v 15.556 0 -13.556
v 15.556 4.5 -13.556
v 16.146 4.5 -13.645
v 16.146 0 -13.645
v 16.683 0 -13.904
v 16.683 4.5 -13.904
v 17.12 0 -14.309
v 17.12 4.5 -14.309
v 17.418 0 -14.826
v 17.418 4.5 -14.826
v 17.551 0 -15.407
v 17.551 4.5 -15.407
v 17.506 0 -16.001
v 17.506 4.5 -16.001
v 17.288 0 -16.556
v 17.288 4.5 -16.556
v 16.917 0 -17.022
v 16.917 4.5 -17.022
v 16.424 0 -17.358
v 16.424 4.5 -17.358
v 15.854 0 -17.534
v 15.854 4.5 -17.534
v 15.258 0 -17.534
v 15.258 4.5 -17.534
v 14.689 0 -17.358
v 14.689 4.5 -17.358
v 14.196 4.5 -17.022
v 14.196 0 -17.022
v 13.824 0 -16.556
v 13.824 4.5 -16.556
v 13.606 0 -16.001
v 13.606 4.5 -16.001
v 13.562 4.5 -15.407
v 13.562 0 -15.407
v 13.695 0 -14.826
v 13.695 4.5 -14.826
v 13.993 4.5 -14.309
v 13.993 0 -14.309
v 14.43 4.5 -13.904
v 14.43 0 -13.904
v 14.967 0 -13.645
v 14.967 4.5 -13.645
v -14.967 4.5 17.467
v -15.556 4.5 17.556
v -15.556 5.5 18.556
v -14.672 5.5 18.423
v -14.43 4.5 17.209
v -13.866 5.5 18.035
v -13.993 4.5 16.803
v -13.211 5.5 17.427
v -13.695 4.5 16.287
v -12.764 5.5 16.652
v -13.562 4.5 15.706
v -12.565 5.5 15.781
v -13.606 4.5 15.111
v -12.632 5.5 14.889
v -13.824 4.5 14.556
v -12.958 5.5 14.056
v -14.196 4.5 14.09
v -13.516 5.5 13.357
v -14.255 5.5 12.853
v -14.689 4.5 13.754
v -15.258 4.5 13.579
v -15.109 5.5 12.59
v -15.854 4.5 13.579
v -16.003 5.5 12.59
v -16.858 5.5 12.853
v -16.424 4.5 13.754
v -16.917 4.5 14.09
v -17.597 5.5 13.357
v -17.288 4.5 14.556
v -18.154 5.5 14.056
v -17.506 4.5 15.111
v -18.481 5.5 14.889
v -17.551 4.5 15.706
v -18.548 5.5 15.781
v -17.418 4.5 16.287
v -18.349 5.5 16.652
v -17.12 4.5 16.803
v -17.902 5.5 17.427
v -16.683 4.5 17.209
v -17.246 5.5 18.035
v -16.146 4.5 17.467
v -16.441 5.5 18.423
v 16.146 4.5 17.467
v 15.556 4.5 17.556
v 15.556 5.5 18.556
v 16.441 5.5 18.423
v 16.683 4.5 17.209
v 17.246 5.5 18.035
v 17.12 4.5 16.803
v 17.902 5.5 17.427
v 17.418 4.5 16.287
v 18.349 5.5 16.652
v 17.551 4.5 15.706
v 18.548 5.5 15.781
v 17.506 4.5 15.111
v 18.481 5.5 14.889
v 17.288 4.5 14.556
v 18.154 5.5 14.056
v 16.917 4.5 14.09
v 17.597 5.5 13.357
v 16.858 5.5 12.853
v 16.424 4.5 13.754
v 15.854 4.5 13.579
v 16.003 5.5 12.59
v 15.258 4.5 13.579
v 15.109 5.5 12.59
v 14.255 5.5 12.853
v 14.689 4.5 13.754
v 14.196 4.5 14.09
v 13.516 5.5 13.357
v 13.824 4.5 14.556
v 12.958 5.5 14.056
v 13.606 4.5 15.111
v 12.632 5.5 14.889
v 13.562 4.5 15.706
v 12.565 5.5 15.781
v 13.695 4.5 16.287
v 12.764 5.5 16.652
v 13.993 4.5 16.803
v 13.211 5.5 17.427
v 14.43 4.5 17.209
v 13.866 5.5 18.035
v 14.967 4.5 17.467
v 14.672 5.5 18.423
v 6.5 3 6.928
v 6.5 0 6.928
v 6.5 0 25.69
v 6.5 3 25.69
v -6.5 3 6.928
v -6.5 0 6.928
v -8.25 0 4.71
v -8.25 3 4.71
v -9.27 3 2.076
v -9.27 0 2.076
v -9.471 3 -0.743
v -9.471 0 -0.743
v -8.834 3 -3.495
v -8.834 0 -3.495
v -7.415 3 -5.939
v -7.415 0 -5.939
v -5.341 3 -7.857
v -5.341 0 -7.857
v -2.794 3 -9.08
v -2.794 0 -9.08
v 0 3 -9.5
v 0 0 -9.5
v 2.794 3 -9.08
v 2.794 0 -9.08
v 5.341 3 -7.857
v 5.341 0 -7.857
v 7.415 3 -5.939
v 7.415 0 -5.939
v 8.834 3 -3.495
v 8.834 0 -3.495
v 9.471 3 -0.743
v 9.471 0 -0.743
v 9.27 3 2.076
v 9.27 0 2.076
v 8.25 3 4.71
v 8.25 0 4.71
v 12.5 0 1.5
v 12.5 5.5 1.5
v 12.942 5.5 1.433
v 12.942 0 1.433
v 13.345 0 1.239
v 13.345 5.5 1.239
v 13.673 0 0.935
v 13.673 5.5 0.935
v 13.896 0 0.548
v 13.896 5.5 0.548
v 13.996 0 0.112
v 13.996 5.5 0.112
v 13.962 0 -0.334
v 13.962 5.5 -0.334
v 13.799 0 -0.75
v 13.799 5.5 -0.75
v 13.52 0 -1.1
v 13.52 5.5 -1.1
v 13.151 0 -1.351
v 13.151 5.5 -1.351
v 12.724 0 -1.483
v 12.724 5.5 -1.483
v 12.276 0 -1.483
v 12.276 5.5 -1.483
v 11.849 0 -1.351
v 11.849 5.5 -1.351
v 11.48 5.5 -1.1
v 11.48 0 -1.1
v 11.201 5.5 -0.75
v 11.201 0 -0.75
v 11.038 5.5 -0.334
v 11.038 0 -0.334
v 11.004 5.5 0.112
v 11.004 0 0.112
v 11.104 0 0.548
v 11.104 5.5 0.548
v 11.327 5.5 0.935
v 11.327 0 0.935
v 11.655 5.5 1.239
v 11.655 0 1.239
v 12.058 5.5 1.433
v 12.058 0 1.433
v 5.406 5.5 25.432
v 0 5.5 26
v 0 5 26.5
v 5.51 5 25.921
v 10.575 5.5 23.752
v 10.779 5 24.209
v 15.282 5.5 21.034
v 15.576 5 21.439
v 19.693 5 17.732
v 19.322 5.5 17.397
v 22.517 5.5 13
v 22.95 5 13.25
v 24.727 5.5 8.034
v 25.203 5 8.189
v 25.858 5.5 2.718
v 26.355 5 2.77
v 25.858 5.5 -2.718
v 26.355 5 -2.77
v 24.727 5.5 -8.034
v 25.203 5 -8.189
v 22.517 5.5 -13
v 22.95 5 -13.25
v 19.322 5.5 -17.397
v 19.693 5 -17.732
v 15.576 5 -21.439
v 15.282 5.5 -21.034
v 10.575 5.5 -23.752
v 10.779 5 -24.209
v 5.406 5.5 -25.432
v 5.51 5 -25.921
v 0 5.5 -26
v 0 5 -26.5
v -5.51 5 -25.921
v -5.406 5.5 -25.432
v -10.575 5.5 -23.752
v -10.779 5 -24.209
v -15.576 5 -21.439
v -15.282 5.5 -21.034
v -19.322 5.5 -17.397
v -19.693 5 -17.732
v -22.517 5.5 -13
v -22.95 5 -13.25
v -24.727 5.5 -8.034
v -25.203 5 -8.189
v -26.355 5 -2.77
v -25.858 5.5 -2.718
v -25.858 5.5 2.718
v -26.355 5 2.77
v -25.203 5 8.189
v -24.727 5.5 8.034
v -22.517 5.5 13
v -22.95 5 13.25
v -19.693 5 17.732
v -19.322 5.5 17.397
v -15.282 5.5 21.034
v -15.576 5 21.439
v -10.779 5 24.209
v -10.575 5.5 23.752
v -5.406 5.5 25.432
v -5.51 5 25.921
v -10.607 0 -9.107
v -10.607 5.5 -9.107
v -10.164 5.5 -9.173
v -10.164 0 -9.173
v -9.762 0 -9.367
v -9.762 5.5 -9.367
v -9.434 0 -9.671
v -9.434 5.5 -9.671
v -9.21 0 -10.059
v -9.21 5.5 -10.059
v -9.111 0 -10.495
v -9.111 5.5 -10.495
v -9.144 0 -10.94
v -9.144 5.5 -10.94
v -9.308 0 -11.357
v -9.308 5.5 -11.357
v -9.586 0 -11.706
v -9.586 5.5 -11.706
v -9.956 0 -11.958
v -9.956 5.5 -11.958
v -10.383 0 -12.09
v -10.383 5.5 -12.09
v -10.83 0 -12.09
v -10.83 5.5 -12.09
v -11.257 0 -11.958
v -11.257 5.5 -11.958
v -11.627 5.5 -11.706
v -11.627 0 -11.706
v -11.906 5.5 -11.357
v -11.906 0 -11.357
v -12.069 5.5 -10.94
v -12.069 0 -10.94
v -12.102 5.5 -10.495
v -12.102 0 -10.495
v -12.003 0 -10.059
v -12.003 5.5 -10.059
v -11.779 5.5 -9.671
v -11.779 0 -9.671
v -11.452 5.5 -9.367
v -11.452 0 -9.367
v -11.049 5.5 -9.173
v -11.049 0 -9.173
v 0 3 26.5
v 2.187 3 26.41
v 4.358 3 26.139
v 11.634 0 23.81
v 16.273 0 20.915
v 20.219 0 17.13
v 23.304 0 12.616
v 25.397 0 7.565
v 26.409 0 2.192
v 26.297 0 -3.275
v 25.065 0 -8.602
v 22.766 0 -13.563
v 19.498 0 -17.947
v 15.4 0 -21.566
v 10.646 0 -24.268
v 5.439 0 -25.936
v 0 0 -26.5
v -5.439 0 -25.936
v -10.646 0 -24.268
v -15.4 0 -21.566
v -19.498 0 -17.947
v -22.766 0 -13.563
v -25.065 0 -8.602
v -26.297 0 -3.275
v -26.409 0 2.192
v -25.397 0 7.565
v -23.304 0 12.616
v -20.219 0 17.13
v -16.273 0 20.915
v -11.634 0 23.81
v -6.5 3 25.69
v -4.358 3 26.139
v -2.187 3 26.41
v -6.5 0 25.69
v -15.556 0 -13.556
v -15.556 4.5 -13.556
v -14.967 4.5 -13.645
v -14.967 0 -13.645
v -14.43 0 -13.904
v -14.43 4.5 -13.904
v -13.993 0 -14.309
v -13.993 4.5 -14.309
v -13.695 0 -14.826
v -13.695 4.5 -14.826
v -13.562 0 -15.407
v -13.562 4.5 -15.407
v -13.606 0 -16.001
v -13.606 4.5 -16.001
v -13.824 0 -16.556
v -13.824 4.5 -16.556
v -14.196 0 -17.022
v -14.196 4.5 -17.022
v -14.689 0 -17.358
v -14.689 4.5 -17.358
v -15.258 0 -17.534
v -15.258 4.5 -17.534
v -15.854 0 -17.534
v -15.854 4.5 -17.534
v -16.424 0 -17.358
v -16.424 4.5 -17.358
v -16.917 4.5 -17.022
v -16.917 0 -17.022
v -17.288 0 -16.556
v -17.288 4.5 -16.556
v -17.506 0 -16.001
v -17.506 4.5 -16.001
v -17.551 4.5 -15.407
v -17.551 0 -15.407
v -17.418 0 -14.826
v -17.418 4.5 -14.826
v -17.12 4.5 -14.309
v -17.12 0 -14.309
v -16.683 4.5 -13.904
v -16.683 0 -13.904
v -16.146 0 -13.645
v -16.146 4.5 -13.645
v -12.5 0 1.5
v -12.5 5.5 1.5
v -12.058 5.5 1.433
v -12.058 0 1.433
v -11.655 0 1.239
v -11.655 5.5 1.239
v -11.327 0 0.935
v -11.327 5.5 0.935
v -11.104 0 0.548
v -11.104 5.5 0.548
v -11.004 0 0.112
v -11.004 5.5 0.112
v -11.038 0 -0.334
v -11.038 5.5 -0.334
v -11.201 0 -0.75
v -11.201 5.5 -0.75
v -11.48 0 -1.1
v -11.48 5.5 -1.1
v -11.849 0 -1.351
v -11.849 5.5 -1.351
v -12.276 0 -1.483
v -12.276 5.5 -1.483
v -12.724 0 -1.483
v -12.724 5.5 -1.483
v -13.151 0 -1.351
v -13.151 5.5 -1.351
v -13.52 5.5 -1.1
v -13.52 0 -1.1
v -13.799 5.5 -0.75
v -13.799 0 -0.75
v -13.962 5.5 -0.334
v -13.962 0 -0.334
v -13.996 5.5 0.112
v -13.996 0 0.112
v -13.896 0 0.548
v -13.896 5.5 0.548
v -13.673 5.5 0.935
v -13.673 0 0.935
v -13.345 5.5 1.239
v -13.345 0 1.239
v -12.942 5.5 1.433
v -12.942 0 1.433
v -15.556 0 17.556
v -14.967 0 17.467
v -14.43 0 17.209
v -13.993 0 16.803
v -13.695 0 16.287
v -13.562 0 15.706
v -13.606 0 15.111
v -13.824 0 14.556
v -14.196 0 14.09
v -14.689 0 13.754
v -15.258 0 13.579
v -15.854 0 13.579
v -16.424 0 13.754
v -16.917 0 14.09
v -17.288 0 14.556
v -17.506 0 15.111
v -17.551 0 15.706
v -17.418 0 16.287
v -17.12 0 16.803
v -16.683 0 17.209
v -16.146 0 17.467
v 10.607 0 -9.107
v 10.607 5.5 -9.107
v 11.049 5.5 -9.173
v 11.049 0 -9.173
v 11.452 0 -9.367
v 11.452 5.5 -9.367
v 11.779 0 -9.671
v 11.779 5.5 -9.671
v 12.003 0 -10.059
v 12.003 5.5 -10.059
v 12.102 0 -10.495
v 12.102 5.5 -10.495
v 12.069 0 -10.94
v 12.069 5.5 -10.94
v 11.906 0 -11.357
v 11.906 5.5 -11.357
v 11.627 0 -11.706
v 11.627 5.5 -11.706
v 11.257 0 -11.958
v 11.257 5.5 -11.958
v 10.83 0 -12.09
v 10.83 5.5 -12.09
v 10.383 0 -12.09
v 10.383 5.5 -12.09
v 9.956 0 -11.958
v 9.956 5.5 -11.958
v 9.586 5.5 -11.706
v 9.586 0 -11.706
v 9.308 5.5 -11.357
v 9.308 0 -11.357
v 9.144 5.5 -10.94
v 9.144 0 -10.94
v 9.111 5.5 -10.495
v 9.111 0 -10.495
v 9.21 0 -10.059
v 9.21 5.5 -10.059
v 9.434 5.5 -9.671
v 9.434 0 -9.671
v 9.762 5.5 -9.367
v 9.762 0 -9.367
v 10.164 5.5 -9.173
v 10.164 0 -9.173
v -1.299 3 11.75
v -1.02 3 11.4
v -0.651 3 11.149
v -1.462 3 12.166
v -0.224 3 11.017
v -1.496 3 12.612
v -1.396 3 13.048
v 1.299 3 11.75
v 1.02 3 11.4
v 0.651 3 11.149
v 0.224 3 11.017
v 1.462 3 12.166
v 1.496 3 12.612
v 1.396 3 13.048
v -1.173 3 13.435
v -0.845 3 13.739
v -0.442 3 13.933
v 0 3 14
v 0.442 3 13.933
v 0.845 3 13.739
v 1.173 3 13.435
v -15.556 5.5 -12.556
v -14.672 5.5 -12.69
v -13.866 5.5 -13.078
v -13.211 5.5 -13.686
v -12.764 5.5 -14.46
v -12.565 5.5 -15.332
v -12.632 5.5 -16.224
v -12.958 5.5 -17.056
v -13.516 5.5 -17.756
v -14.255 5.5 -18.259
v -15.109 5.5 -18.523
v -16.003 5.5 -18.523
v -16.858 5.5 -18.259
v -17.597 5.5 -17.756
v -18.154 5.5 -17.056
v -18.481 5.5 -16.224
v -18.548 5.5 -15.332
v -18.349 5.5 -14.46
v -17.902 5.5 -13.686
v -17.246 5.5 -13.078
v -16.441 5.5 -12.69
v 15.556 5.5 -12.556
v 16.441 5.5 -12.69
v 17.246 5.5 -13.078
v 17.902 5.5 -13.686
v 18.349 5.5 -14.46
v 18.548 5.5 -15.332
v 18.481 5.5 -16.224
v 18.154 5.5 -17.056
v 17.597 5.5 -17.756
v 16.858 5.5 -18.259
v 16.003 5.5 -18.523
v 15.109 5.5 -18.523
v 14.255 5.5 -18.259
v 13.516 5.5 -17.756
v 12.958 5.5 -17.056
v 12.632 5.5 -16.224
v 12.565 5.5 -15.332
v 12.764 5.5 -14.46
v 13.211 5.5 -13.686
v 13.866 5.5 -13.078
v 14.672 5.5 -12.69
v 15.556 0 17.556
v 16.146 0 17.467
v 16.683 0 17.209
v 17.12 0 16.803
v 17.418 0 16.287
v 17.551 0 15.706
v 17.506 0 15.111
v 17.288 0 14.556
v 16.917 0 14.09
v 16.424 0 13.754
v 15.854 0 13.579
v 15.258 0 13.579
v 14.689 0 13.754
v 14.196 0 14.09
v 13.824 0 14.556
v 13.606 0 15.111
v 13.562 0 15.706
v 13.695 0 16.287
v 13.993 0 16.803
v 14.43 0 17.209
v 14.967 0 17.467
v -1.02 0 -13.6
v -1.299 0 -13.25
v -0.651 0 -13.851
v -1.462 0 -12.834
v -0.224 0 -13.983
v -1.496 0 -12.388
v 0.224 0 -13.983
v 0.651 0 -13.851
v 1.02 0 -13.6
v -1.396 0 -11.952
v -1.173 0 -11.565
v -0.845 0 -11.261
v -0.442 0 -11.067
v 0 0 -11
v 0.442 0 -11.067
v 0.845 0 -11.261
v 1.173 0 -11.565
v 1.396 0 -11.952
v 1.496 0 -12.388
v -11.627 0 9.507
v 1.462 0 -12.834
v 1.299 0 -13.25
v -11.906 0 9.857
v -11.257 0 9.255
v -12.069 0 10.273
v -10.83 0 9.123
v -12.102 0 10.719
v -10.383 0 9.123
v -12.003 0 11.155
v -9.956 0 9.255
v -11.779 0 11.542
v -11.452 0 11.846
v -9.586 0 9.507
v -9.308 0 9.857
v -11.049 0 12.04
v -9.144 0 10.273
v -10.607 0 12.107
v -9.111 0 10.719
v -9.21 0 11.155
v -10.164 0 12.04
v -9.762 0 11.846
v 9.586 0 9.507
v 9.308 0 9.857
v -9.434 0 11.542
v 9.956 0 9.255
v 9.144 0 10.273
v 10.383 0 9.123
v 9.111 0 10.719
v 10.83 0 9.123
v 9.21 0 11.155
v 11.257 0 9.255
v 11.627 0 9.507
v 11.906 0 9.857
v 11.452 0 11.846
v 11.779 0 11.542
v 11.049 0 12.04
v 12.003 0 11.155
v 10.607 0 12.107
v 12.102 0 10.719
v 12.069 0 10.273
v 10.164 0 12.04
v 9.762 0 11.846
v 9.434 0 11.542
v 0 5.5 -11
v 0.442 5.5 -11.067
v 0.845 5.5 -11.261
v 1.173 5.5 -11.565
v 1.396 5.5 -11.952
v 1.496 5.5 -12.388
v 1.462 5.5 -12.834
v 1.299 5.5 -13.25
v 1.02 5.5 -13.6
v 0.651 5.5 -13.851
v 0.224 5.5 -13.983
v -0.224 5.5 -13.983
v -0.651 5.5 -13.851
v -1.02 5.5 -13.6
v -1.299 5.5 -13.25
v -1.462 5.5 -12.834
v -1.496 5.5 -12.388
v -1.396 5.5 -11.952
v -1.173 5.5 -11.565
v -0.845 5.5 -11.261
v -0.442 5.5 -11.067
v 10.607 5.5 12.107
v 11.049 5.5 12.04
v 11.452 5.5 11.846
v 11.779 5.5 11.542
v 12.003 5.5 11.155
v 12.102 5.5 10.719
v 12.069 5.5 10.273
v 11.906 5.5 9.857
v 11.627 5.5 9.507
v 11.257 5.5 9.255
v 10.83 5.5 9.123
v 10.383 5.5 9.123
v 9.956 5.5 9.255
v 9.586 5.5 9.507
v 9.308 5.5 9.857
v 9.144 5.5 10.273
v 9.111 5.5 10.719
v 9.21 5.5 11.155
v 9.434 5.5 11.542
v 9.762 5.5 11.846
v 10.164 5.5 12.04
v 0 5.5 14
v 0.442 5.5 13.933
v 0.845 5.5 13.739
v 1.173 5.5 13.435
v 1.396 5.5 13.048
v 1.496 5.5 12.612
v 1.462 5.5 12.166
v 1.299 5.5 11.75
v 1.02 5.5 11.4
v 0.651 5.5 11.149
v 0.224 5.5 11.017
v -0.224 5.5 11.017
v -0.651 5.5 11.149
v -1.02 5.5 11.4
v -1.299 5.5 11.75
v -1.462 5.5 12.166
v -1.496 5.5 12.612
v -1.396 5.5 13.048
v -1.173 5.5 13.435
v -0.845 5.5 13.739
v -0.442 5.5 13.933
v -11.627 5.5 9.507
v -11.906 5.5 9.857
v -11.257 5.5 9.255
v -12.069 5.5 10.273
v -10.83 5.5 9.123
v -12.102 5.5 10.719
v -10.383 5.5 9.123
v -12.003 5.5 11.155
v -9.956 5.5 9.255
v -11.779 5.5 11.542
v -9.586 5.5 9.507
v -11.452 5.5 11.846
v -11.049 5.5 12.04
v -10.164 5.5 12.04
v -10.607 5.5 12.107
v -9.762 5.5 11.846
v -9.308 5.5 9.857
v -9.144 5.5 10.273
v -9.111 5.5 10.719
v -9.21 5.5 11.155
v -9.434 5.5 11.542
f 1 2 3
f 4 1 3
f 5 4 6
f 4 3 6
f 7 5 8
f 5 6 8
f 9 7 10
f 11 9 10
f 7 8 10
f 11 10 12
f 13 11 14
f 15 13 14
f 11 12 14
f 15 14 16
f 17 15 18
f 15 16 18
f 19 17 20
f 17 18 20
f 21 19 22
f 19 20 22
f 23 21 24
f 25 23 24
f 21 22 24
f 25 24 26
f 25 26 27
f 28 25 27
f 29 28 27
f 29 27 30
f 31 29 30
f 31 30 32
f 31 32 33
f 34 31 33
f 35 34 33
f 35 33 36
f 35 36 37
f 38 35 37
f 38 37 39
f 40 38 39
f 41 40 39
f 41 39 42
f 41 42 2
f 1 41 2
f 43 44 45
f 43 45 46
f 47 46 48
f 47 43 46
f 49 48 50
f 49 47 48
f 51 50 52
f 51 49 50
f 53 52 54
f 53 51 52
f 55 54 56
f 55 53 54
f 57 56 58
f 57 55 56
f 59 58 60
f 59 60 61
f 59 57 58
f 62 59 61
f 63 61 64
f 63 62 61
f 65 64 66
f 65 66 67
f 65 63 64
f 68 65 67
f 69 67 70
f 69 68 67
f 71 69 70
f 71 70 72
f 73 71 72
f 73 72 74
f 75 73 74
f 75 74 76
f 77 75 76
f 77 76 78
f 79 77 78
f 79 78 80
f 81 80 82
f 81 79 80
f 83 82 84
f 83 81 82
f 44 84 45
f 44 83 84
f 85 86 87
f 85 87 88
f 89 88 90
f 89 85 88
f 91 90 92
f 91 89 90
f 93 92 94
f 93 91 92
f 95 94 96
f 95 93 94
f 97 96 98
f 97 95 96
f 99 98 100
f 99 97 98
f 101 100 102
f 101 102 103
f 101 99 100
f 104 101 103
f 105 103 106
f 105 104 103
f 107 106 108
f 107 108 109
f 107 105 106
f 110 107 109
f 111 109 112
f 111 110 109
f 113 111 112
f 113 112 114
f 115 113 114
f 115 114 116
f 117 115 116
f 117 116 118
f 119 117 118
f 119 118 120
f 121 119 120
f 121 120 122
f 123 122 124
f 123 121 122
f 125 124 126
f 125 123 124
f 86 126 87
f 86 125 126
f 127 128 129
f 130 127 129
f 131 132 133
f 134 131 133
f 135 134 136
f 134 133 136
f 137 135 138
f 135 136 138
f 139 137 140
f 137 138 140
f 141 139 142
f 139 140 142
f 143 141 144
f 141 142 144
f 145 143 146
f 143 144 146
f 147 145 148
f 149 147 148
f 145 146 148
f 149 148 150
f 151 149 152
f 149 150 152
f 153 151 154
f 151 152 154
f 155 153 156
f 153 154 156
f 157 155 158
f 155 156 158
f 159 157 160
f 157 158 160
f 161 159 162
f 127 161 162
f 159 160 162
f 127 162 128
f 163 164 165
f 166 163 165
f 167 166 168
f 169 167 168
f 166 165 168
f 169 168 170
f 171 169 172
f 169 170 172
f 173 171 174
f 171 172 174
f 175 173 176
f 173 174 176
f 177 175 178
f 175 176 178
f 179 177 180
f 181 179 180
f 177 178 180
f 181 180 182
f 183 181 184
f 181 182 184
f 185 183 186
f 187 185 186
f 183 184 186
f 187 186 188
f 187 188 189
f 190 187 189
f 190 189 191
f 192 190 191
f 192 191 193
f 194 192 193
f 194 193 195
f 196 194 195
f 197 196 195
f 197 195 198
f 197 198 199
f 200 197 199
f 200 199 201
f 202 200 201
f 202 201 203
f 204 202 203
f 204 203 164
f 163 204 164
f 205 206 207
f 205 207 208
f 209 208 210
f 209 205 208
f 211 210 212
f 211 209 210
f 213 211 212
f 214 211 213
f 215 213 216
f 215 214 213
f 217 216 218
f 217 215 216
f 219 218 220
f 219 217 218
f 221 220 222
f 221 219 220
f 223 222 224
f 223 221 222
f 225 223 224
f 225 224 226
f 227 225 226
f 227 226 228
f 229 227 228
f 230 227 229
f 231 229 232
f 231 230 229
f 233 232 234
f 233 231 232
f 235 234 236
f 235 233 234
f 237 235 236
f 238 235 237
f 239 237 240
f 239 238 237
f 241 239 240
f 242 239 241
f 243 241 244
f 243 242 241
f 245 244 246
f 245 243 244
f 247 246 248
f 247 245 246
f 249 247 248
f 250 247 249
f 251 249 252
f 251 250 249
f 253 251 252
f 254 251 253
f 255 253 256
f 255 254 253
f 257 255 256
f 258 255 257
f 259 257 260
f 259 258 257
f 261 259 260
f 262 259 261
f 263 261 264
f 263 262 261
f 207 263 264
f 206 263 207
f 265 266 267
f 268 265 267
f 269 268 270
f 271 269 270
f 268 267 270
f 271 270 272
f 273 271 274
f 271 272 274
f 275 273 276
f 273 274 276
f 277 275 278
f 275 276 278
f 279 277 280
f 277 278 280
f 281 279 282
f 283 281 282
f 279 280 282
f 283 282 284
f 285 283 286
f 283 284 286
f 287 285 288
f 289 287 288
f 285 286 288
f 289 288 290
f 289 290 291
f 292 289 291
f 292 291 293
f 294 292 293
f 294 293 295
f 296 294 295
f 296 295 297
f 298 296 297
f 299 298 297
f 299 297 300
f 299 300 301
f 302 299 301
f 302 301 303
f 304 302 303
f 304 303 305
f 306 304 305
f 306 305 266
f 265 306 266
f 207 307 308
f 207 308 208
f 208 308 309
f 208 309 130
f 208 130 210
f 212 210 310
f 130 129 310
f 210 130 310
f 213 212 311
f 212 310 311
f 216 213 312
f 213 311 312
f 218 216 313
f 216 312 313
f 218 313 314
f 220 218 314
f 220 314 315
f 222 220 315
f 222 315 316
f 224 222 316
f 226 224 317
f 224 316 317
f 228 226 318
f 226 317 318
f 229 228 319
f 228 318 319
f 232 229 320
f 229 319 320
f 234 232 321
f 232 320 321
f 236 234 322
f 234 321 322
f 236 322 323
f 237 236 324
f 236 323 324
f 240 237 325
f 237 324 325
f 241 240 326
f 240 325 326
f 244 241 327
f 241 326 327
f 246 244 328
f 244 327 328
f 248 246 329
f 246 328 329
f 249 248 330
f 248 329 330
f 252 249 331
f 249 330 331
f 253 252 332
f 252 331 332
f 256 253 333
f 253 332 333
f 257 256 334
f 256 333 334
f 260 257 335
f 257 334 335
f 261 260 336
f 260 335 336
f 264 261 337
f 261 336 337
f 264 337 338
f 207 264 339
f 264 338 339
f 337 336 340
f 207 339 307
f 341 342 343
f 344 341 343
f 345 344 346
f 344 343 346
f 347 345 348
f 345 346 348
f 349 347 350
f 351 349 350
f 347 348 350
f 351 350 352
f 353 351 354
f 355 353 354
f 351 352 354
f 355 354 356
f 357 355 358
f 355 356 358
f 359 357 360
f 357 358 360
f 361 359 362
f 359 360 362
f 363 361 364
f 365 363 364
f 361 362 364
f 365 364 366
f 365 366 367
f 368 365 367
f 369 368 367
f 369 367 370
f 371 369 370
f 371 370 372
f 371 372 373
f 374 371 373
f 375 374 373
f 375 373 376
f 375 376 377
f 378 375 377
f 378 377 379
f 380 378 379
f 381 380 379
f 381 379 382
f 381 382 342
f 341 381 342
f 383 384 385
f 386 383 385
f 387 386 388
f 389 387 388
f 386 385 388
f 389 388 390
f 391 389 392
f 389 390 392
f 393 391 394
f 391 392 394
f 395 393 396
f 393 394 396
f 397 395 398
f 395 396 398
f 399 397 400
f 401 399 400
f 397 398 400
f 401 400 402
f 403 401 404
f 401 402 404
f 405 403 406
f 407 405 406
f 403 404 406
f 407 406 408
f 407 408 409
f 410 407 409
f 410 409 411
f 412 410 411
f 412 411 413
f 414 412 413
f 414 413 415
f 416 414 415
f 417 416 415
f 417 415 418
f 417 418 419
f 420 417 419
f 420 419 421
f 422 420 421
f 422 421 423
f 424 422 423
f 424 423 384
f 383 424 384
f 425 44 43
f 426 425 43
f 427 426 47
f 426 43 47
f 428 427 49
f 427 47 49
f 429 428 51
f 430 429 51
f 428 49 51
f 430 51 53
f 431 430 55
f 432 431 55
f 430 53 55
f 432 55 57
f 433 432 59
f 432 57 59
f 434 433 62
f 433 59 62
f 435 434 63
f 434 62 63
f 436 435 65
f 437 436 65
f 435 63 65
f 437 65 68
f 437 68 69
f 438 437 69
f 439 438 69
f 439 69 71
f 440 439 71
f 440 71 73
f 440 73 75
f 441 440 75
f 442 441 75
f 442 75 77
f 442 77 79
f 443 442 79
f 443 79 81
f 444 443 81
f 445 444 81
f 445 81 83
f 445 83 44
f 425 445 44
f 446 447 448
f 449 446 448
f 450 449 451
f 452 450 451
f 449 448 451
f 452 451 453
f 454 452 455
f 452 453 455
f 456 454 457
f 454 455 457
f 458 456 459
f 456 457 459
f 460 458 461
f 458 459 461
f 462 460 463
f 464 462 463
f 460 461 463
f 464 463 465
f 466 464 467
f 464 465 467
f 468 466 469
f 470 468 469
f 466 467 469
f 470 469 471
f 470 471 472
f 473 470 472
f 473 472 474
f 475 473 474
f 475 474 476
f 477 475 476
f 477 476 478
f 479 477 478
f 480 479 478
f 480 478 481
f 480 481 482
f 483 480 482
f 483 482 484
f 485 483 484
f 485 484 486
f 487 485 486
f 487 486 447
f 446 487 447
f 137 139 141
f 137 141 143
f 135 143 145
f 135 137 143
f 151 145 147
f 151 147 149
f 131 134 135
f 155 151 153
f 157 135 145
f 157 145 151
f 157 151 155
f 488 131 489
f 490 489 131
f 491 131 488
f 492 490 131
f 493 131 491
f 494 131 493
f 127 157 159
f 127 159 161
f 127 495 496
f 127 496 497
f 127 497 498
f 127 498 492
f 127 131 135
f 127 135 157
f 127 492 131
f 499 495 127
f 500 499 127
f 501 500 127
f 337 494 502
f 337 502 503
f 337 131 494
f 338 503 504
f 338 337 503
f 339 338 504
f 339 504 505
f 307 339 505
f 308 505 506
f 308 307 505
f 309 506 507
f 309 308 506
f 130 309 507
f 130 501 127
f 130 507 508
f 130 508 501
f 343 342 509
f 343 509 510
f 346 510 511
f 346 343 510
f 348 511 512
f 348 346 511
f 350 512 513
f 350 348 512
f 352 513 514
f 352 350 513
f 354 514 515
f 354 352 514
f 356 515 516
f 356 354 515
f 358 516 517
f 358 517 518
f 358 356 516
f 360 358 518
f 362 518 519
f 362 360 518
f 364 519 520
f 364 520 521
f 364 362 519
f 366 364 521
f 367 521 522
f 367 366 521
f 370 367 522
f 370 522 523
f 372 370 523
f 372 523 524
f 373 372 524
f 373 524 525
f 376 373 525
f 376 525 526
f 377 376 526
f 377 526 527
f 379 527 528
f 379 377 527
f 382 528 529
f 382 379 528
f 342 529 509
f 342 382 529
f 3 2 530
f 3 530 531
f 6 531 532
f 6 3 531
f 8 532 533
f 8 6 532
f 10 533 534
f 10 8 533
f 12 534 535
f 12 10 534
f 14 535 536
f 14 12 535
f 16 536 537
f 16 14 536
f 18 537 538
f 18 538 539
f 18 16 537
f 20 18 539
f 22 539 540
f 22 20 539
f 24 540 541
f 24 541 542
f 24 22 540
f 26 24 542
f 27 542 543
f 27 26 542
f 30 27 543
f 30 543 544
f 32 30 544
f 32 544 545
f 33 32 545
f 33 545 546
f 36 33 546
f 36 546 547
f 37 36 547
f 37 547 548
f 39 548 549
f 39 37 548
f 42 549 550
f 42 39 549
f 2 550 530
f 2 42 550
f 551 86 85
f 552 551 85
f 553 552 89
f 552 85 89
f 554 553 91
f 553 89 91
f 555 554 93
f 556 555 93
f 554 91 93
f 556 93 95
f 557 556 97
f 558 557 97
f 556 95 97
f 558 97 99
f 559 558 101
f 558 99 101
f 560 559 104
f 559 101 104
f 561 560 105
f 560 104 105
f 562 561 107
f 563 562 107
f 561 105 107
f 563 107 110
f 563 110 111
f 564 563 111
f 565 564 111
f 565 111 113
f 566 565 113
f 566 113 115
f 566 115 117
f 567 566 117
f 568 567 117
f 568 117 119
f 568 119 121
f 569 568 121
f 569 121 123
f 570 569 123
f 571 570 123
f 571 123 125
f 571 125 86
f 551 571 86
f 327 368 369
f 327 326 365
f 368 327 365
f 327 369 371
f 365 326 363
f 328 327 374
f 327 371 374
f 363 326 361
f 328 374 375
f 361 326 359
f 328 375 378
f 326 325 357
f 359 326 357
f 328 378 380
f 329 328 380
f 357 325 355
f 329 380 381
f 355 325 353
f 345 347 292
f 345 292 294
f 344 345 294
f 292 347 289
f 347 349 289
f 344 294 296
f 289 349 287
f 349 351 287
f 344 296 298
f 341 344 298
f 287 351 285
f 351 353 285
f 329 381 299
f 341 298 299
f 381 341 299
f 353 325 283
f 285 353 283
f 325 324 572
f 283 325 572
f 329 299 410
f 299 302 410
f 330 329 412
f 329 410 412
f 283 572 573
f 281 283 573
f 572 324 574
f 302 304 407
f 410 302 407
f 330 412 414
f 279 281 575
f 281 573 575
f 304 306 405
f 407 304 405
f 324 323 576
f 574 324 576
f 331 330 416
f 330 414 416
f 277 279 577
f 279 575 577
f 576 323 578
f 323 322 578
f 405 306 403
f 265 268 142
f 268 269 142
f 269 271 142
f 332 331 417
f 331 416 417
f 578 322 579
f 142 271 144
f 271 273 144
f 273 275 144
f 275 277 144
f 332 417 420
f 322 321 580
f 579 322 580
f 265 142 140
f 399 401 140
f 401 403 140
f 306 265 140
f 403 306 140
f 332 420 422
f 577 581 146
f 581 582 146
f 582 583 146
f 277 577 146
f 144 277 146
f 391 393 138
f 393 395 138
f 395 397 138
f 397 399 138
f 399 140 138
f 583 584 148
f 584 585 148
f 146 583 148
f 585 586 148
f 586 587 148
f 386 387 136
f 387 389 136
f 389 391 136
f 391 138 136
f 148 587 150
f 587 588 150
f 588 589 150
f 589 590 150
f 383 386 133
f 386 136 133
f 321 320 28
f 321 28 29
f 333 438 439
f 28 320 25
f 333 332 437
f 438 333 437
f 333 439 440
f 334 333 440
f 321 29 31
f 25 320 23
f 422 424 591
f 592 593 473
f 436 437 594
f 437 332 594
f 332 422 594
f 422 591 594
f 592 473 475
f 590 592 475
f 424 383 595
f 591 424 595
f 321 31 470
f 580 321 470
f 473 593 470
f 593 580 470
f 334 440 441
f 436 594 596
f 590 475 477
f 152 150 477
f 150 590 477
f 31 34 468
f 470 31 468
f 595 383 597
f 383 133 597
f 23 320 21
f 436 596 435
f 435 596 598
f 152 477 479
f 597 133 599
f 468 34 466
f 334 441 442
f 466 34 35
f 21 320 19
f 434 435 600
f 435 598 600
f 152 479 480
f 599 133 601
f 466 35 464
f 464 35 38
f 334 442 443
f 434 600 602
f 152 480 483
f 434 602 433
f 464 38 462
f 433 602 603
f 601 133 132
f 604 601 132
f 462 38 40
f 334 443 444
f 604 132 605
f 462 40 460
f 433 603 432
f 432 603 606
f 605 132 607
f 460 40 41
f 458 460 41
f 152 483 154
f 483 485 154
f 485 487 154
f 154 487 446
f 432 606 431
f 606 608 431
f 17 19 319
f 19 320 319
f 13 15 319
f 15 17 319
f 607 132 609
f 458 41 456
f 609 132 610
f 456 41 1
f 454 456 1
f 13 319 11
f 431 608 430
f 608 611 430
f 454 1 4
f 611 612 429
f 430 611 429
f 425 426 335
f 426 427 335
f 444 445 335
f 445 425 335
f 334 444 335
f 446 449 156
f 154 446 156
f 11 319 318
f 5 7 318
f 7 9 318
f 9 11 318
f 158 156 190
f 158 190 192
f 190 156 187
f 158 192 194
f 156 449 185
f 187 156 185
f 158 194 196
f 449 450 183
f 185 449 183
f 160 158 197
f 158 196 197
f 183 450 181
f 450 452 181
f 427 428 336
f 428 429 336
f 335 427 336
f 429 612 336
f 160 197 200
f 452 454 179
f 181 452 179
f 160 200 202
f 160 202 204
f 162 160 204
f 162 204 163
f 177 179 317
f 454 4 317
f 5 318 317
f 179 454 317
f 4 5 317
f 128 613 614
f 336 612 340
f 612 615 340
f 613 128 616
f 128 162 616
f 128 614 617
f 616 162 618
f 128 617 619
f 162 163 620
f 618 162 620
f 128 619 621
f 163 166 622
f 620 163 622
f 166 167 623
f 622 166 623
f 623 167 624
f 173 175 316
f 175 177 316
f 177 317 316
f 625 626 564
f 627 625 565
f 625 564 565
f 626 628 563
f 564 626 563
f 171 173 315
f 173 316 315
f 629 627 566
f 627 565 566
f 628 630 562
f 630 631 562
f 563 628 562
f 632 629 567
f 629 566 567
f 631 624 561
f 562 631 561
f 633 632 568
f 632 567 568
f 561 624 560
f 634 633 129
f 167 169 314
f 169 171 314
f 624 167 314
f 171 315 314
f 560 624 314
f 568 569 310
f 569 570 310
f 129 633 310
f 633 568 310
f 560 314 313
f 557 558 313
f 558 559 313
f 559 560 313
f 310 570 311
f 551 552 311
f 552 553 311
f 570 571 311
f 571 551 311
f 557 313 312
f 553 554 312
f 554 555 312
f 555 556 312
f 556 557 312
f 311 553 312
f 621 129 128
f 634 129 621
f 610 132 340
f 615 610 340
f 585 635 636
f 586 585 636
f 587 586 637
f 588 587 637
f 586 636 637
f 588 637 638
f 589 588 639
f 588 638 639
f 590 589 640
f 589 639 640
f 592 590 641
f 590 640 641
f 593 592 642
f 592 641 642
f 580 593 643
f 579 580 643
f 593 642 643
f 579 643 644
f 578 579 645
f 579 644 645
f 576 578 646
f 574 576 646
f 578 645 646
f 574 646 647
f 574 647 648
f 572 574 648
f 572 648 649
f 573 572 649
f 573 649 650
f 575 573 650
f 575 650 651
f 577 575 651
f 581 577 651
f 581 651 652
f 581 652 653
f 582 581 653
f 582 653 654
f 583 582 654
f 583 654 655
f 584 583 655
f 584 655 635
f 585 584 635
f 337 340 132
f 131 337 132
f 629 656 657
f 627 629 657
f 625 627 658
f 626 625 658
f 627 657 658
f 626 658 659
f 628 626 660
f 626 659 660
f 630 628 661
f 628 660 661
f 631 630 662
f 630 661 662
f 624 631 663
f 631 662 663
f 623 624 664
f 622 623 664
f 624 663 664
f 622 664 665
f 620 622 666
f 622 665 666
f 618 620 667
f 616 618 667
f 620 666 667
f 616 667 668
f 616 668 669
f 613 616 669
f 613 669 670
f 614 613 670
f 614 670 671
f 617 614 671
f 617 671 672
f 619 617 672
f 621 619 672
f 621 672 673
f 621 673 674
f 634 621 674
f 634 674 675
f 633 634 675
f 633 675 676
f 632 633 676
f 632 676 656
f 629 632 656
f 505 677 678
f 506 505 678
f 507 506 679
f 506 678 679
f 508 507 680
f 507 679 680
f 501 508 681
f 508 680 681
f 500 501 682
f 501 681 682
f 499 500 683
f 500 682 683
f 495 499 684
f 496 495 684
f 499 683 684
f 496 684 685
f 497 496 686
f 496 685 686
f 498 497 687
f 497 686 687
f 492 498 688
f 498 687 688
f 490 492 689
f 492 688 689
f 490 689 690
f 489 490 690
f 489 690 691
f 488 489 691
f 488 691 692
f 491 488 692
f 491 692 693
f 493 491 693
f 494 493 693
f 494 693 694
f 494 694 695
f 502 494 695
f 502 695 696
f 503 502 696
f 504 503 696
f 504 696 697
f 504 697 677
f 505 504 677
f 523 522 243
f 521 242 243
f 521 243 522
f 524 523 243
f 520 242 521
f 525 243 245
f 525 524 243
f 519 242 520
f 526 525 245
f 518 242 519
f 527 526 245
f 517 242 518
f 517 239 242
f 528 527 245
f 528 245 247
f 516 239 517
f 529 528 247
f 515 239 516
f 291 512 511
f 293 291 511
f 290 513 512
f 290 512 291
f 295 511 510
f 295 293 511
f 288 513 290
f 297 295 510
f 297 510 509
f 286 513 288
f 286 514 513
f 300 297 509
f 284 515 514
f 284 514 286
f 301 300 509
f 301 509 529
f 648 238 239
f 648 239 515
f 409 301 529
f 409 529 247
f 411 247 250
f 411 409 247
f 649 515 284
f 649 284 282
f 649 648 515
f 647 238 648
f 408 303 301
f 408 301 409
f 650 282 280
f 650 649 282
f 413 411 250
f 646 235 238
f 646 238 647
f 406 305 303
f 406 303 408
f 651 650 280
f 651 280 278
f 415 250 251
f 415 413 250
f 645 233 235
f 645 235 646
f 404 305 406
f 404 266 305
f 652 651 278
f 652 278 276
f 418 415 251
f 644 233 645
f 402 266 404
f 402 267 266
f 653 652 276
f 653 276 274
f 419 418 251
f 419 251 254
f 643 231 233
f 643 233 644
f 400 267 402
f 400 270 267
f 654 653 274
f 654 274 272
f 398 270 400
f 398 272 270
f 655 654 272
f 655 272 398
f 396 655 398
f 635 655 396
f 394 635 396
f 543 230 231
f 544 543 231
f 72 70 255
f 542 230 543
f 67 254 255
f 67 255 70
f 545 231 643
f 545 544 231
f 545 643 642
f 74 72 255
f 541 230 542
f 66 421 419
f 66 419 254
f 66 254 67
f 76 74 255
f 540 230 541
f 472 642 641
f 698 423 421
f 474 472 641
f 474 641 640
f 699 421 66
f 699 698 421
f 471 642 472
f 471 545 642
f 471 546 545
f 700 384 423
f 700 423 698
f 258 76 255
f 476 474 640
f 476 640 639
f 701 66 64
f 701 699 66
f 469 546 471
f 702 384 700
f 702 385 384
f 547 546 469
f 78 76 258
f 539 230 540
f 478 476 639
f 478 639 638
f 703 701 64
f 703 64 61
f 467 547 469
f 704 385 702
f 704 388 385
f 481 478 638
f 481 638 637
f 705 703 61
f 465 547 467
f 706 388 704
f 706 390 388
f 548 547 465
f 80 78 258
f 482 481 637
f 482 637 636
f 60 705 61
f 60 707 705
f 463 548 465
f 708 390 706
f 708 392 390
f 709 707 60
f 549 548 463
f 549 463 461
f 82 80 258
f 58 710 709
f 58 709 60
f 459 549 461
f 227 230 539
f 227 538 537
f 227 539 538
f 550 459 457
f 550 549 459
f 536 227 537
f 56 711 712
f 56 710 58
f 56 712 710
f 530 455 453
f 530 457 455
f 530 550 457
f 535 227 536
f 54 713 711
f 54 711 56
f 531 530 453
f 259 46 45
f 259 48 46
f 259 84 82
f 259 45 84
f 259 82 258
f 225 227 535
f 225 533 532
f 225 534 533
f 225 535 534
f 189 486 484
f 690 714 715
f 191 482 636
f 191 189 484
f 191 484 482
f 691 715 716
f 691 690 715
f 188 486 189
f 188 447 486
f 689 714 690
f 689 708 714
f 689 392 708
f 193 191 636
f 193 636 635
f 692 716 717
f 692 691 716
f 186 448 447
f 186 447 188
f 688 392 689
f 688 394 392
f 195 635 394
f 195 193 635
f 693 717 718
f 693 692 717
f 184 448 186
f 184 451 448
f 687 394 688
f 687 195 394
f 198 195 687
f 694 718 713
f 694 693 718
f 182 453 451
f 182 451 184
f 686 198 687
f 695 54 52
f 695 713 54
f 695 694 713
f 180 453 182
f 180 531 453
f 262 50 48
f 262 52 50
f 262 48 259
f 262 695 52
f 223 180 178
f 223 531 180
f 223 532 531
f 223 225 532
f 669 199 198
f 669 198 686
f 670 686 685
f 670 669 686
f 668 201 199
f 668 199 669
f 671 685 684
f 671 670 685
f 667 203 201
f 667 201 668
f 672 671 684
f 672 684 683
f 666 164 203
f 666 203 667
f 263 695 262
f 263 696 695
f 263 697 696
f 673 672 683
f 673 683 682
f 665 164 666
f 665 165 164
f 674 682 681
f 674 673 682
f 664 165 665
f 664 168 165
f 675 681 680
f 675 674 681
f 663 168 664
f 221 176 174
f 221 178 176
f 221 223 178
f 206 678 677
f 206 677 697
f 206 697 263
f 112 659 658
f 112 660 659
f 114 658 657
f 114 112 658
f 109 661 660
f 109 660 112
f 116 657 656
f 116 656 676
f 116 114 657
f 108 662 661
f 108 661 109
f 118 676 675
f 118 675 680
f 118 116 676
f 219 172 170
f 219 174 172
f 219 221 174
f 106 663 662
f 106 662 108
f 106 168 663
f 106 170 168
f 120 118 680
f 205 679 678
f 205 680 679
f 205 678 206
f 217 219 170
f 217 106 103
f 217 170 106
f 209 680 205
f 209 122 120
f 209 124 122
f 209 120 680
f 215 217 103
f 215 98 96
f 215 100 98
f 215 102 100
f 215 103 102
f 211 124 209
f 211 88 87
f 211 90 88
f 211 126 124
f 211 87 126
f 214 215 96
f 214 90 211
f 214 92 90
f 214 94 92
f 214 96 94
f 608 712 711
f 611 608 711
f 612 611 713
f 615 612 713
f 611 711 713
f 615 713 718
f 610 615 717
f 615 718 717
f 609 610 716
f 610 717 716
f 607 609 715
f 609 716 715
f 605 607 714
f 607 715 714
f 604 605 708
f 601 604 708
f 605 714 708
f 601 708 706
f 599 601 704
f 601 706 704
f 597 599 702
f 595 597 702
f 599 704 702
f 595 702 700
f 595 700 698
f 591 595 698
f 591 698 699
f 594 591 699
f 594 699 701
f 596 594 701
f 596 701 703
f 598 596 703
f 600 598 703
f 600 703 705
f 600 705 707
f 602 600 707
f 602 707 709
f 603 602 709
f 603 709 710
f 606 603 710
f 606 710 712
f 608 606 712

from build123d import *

# Parameters (mm, degrees)
SKETCH_1_R          = 26.5
EXTRUDE_1_DEPTH     = 5.5
CHAMFER_1_SIZE      = 0.5
SKETCH_4_R          = 2
CUT_EXTRUDE_2_DEPTH = 38.878093933
CHAMFER_2_SIZE      = 1
SKETCH_5_R          = 1.5
CUT_EXTRUDE_3_DEPTH = 38.878093933
CUT_EXTRUDE_4_DEPTH = 3


with BuildPart() as part:
    # Эскиз1 → Бобышка-Вытянуть1 (new body)
    with BuildSketch(Plane(origin=(0, 0, 0), x_dir=(1, 0, 0), z_dir=(0, 1, 0))):
        with Locations(Location((0, 0, 0), (0, 0, 270))):
            Circle(SKETCH_1_R)
    extrude(amount=EXTRUDE_1_DEPTH)

    # Фаска1
    chamfer_1_edges = [part.edges().sort_by_distance(p)[0] for p in [
        (0, 5.5, -26.5),
    ]]
    chamfer(chamfer_1_edges, length=CHAMFER_1_SIZE)

    # Эскиз4 → Вырез-Вытянуть2 (cut, through all)
    with BuildSketch(Plane(origin=(0, 5.5, 0), x_dir=(1, 0, 0), z_dir=(0, 1, 0))):
        with Locations(Location((-15.556349186, 15.556349186, 0), (0, 0, 270))):
            Circle(SKETCH_4_R)
        with Locations(Location((15.556349186, 15.556349186, 0), (0, 0, 270))):
            Circle(SKETCH_4_R)
        with Locations(Location((15.556349186, -15.556349186, 0), (0, 0, 270))):
            Circle(SKETCH_4_R)
        with Locations(Location((-15.556349186, -15.556349186, 0), (0, 0, 270))):
            Circle(SKETCH_4_R)
    extrude(amount=-CUT_EXTRUDE_2_DEPTH, mode=Mode.SUBTRACT)

    # Фаска2
    chamfer_2_edges = [part.edges().sort_by_distance(p)[0] for p in [
        (-15.556349186, 5.5, 13.556349186),
        (15.556349186, 5.5, 13.556349186),
        (15.556349186, 5.5, -17.556349186),
        (-15.556349186, 5.5, -17.556349186),
    ]]
    chamfer(chamfer_2_edges, length=CHAMFER_2_SIZE)

    # Эскиз5 → Вырез-Вытянуть3 (cut, through all)
    with BuildSketch(Plane(origin=(0, 5.5, 0), x_dir=(1, 0, 0), z_dir=(0, 1, 0))):
        with Locations(Location((0, 12.5, 0), (0, 0, 270))):
            Circle(SKETCH_5_R)
        with Locations(Location((12.5, 0, 0), (0, 0, 270))):
            Circle(SKETCH_5_R)
        with Locations(Location((0, -12.5, 0), (0, 0, 270))):
            Circle(SKETCH_5_R)
        with Locations(Location((-12.5, 0, 0), (0, 0, 270))):
            Circle(SKETCH_5_R)
        with Locations(Location((10.606601718, 10.606601718, 0), (0, 0, 270))):
            Circle(SKETCH_5_R)
        with Locations(Location((10.606601718, -10.606601718, 0), (0, 0, 270))):
            Circle(SKETCH_5_R)
        with Locations(Location((-10.606601718, -10.606601718, 0), (0, 0, 270))):
            Circle(SKETCH_5_R)
        with Locations(Location((-10.606601718, 10.606601718, 0), (0, 0, 270))):
            Circle(SKETCH_5_R)
    extrude(amount=-CUT_EXTRUDE_3_DEPTH, mode=Mode.SUBTRACT)

    # Эскиз6 → Вырез-Вытянуть4 (cut)
    with BuildSketch(Plane.XZ):
        with BuildLine():
            Line((6.5, 6.92820323), (6.5, 25.690465157))
            ThreePointArc((6.5, 25.690465157), (0, 26.5), (-6.5, 25.690465157))
            Line((-6.5, 25.690465157), (-6.5, 6.92820323))
            ThreePointArc((-6.5, 6.92820323), (0, -9.5), (6.5, 6.92820323))
        make_face()
    extrude(amount=-CUT_EXTRUDE_4_DEPTH, mode=Mode.SUBTRACT)


solid = part.part
